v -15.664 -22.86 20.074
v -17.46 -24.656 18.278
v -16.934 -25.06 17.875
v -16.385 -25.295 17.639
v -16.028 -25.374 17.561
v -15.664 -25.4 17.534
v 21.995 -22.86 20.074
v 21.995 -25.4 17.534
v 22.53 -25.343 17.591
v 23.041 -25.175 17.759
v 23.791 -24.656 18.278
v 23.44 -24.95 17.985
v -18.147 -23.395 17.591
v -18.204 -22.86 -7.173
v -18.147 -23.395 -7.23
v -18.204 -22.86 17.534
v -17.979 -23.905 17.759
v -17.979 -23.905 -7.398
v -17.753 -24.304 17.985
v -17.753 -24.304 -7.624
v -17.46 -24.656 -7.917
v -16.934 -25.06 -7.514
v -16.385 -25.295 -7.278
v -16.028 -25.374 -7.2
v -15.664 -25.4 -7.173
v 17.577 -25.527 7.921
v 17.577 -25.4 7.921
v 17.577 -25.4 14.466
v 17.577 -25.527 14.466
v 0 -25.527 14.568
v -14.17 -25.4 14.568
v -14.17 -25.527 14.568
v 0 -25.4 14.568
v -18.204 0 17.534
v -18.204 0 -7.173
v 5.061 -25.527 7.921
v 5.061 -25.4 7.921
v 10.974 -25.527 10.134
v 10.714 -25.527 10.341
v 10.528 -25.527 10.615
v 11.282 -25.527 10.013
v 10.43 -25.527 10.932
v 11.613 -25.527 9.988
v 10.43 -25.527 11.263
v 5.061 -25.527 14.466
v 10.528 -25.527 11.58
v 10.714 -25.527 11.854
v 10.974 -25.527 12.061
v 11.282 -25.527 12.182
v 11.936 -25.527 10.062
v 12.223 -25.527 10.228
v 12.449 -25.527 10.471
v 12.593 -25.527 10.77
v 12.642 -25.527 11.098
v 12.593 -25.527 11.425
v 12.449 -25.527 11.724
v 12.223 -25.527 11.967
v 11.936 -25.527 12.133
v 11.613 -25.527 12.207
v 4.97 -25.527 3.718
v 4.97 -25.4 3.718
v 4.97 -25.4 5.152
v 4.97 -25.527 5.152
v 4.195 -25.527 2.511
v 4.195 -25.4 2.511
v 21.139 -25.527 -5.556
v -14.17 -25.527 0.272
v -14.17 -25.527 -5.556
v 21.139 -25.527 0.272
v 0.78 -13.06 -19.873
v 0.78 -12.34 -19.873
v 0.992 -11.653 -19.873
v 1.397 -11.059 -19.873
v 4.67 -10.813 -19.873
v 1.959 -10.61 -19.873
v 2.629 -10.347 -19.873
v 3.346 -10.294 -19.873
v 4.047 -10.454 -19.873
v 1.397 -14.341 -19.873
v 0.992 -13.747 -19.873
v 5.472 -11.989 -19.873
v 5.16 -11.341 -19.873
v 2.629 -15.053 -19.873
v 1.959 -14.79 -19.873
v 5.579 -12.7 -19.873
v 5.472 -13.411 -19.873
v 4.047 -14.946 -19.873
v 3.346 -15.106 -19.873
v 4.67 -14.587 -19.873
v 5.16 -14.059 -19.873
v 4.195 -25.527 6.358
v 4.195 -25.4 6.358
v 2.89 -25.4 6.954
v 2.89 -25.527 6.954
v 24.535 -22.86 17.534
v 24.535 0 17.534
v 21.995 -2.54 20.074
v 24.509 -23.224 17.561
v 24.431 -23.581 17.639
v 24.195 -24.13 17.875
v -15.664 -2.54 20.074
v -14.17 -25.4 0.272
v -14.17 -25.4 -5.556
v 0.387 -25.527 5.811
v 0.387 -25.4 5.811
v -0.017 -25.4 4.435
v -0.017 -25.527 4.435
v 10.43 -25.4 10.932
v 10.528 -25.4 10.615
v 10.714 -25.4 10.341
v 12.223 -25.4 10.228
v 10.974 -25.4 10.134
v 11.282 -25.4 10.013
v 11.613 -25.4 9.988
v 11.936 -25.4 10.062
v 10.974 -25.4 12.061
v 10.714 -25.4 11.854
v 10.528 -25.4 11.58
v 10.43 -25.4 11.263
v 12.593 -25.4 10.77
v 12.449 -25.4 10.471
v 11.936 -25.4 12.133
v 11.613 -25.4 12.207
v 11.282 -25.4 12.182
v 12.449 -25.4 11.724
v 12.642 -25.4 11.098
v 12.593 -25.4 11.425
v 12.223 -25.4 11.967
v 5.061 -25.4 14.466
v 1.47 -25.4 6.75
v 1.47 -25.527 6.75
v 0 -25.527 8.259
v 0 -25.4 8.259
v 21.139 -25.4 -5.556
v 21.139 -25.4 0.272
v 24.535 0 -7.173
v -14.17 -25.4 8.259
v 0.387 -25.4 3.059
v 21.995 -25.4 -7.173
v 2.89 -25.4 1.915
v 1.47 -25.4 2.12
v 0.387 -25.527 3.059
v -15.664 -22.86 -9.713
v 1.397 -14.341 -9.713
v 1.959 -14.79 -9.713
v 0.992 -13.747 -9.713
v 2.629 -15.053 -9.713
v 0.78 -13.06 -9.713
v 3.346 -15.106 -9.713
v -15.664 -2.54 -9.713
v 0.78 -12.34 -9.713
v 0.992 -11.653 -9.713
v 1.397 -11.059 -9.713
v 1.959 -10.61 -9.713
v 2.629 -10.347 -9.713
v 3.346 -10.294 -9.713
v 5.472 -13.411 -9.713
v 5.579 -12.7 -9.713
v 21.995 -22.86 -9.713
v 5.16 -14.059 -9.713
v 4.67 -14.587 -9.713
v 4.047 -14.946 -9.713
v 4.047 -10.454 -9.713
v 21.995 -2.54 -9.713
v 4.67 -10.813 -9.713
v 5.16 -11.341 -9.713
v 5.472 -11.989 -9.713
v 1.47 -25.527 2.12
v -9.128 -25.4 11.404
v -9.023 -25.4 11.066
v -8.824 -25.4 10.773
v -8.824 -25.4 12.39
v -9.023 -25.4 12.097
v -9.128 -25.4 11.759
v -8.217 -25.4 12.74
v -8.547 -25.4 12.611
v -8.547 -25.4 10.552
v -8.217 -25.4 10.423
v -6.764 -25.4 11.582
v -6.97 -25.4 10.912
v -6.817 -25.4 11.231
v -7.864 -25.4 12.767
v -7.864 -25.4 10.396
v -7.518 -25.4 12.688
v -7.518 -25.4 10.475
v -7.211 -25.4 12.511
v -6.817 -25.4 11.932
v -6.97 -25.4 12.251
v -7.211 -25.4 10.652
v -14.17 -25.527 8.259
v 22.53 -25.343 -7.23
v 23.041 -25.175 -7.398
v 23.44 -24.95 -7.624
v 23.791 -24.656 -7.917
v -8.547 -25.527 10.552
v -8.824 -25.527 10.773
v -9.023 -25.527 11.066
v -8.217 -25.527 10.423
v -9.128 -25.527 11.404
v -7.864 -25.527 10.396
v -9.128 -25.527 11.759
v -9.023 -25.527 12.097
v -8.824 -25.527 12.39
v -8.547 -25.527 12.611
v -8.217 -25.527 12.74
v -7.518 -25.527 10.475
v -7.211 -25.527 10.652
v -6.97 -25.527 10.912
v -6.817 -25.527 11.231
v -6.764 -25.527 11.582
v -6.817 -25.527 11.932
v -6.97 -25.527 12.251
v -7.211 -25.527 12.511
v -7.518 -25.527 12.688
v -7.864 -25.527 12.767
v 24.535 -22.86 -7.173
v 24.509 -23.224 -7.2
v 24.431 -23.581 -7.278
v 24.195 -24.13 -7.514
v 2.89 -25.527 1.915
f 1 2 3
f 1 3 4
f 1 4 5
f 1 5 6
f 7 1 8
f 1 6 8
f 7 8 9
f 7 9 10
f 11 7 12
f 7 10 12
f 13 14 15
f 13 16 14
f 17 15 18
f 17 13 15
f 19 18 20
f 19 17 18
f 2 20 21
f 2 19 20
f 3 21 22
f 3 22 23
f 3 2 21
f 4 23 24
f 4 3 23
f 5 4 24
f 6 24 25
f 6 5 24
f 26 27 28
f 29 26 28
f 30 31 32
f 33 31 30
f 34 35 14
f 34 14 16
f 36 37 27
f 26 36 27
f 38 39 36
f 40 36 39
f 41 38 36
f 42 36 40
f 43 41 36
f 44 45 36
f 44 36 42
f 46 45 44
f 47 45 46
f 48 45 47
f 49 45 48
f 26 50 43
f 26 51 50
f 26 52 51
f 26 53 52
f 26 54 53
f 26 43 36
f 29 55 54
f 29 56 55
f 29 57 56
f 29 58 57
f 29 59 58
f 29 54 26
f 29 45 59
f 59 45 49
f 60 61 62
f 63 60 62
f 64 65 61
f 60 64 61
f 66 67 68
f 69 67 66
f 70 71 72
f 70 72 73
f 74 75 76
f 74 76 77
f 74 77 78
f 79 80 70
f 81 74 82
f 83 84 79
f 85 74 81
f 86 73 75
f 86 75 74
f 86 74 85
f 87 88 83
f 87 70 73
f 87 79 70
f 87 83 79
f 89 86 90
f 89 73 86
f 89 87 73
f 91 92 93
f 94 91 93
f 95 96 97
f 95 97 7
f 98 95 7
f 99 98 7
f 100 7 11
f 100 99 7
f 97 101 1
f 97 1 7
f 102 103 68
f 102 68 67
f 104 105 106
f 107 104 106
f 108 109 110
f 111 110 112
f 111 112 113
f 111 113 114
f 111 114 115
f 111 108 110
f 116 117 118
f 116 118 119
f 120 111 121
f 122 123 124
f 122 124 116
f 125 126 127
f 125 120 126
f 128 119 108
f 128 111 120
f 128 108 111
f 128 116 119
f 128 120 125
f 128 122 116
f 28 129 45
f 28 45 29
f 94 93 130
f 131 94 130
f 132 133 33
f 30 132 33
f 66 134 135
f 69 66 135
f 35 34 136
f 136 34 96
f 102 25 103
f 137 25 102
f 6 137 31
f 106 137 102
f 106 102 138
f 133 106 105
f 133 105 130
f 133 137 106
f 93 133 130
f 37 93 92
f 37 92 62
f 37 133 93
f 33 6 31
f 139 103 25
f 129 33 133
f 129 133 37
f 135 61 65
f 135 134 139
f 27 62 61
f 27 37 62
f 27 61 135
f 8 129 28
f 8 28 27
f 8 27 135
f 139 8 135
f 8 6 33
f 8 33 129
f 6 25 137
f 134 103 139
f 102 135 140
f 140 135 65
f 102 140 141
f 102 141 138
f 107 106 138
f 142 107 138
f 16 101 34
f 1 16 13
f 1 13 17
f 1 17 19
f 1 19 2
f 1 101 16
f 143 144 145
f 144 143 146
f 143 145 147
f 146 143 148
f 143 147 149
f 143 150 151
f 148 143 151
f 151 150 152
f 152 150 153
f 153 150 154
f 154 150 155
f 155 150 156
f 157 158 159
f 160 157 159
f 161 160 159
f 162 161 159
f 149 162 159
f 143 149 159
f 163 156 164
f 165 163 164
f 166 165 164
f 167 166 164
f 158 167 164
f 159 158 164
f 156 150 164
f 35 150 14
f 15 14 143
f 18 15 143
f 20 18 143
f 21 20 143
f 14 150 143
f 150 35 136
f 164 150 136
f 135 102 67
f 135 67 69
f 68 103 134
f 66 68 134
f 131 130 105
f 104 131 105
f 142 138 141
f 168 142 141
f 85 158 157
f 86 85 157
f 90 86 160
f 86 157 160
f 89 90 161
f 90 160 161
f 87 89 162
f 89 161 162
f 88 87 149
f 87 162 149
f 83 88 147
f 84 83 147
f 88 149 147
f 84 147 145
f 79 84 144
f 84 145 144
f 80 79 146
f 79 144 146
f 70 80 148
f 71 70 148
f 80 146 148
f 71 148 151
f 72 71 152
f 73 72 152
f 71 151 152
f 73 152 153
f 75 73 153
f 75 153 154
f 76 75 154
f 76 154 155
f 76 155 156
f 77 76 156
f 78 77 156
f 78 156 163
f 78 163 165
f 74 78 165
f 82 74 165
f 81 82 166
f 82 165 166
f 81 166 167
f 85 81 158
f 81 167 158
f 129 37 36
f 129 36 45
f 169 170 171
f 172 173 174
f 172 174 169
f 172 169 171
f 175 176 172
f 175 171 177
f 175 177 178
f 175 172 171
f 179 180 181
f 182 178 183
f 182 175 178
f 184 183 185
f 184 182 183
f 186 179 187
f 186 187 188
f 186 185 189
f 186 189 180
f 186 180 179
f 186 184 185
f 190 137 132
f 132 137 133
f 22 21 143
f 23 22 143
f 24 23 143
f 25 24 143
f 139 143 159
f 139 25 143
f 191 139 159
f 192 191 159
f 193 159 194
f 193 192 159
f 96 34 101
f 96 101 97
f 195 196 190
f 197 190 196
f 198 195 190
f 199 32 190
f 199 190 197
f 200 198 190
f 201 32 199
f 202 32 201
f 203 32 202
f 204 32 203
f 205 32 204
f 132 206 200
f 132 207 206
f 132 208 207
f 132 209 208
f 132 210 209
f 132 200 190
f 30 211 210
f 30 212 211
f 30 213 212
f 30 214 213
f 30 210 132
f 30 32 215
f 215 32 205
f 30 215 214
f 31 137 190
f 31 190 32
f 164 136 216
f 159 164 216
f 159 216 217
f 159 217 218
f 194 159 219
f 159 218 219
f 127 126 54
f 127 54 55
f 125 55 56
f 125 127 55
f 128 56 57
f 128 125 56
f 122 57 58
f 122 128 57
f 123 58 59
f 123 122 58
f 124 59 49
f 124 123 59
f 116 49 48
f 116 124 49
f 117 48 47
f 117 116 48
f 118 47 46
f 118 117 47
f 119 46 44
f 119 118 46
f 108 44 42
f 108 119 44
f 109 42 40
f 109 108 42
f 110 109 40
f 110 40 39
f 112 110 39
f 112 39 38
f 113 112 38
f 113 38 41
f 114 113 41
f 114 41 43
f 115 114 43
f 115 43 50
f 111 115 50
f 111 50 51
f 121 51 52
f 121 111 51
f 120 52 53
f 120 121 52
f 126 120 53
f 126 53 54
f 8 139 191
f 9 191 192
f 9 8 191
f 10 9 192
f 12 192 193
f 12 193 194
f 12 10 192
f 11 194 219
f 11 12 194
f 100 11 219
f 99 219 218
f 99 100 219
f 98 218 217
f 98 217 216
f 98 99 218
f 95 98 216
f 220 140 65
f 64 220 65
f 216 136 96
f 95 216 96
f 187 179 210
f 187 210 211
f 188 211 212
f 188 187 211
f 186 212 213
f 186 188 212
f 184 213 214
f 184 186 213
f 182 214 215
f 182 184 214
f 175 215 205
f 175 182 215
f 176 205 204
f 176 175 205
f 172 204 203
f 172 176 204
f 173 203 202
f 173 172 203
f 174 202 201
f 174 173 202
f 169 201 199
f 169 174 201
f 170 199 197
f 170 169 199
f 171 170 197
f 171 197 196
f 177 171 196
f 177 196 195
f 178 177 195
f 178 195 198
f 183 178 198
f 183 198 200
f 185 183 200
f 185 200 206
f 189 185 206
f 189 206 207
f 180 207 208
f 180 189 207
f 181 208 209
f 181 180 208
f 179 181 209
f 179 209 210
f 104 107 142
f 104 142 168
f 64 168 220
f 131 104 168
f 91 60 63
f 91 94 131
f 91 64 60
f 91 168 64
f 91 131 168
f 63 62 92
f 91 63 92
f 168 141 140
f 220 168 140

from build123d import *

# Parameters (mm, degrees)
F0_W     = 85.4783095419
F0_H     = 59.5757905394
F1_DEPTH = 50.8
F2_W     = 28.3403936774
F2_H     = 12.6175824553
F2_R     = 2.3774170248
F2_W_2   = 25.0316578895
F2_H_2   = 13.0906309932
F2_R_2   = 2.2246950569
F2_W_3   = 70.6177633256
F2_H_3   = 11.6556163412
F3_DEPTH = 0.254
F4_SIZE  = 5.08
F5_R     = 5.08
F6_SCALE = 0.5
F7_R     = 2.413
F8_DEPTH = 10.16


with BuildPart() as f1:
    # F0 (on Front) → F1 (new body)
    with BuildSketch(Plane.XZ):
        with Locations((6.331725046, 10.3610074148)):
            Rectangle(F0_W, F0_H)
    extrude(amount=F1_DEPTH)

    # F2 (on face) → F3 (join)
    with BuildSketch(Plane.XZ.offset(50.8)):
        with Locations((-14.1701968387, 22.8276690468)):
            Rectangle(F2_W, F2_H)
        with Locations((-15.9050039947, 23.1631565839)):
            Circle(F2_R, mode=Mode.SUBTRACT)
        with Locations((22.638711147, 22.3876358941)):
            Rectangle(F2_W_2, F2_H_2)
        with Locations((23.0593848974, 22.195097059)):
            Circle(F2_R_2, mode=Mode.SUBTRACT)
        Polygon((9.9397739728, 7.435437333), (9.9397739728, 10.3037140541), (8.3890665016, 12.7166619788), (5.7799902246, 13.9081871902), (2.9409084248, 13.4999888525), (0.7732095137, 11.6216670538), (-0.0348774207, 8.8695756935), (0.7732095137, 6.1174843332), (2.9409084248, 4.2391625345), (5.7799902246, 3.8309641968), (8.3890665016, 5.0224894082), align=None)
        with Locations((6.9684879854, -5.284418934)):
            Rectangle(F2_W_3, F2_H_3)
    extrude(amount=F3_DEPTH)

    # F4
    f4_edges = [f1.edges().sort_by_distance(p)[0] for p in [
        (49.07088, -25.4, 40.148903),
        (-36.40743, -25.4, 40.148903),
        (6.331725, 0, 40.148903),
        (6.331725, -50.8, 40.148903),
        (-36.40743, -25.4, -19.426888),
        (49.07088, -25.4, -19.426888),
        (6.331725, 0, -19.426888),
        (6.331725, -50.8, -19.426888),
    ]]
    chamfer(f4_edges, length=F4_SIZE)

    # F5
    f5_edges = [f1.edges().sort_by_distance(p)[0] for p in [
        (-36.40743, -50.8, 10.361007),
        (49.07088, -50.8, 10.361007),
    ]]
    fillet(f5_edges, radius=F5_R)


with BuildPart() as f1_1:
    # F6: moved
    add(f1.part.scale(F6_SCALE))

    # F7 (on face) → F8 (join)
    with BuildSketch(Plane(origin=(0, 0, -9.7134439275), x_dir=(1, 0, 0), z_dir=(0, 0, -1))):
        with Locations((3.165862523, 12.7)):
            Circle(F7_R)
    extrude(amount=F8_DEPTH)


solid = f1_1.part
